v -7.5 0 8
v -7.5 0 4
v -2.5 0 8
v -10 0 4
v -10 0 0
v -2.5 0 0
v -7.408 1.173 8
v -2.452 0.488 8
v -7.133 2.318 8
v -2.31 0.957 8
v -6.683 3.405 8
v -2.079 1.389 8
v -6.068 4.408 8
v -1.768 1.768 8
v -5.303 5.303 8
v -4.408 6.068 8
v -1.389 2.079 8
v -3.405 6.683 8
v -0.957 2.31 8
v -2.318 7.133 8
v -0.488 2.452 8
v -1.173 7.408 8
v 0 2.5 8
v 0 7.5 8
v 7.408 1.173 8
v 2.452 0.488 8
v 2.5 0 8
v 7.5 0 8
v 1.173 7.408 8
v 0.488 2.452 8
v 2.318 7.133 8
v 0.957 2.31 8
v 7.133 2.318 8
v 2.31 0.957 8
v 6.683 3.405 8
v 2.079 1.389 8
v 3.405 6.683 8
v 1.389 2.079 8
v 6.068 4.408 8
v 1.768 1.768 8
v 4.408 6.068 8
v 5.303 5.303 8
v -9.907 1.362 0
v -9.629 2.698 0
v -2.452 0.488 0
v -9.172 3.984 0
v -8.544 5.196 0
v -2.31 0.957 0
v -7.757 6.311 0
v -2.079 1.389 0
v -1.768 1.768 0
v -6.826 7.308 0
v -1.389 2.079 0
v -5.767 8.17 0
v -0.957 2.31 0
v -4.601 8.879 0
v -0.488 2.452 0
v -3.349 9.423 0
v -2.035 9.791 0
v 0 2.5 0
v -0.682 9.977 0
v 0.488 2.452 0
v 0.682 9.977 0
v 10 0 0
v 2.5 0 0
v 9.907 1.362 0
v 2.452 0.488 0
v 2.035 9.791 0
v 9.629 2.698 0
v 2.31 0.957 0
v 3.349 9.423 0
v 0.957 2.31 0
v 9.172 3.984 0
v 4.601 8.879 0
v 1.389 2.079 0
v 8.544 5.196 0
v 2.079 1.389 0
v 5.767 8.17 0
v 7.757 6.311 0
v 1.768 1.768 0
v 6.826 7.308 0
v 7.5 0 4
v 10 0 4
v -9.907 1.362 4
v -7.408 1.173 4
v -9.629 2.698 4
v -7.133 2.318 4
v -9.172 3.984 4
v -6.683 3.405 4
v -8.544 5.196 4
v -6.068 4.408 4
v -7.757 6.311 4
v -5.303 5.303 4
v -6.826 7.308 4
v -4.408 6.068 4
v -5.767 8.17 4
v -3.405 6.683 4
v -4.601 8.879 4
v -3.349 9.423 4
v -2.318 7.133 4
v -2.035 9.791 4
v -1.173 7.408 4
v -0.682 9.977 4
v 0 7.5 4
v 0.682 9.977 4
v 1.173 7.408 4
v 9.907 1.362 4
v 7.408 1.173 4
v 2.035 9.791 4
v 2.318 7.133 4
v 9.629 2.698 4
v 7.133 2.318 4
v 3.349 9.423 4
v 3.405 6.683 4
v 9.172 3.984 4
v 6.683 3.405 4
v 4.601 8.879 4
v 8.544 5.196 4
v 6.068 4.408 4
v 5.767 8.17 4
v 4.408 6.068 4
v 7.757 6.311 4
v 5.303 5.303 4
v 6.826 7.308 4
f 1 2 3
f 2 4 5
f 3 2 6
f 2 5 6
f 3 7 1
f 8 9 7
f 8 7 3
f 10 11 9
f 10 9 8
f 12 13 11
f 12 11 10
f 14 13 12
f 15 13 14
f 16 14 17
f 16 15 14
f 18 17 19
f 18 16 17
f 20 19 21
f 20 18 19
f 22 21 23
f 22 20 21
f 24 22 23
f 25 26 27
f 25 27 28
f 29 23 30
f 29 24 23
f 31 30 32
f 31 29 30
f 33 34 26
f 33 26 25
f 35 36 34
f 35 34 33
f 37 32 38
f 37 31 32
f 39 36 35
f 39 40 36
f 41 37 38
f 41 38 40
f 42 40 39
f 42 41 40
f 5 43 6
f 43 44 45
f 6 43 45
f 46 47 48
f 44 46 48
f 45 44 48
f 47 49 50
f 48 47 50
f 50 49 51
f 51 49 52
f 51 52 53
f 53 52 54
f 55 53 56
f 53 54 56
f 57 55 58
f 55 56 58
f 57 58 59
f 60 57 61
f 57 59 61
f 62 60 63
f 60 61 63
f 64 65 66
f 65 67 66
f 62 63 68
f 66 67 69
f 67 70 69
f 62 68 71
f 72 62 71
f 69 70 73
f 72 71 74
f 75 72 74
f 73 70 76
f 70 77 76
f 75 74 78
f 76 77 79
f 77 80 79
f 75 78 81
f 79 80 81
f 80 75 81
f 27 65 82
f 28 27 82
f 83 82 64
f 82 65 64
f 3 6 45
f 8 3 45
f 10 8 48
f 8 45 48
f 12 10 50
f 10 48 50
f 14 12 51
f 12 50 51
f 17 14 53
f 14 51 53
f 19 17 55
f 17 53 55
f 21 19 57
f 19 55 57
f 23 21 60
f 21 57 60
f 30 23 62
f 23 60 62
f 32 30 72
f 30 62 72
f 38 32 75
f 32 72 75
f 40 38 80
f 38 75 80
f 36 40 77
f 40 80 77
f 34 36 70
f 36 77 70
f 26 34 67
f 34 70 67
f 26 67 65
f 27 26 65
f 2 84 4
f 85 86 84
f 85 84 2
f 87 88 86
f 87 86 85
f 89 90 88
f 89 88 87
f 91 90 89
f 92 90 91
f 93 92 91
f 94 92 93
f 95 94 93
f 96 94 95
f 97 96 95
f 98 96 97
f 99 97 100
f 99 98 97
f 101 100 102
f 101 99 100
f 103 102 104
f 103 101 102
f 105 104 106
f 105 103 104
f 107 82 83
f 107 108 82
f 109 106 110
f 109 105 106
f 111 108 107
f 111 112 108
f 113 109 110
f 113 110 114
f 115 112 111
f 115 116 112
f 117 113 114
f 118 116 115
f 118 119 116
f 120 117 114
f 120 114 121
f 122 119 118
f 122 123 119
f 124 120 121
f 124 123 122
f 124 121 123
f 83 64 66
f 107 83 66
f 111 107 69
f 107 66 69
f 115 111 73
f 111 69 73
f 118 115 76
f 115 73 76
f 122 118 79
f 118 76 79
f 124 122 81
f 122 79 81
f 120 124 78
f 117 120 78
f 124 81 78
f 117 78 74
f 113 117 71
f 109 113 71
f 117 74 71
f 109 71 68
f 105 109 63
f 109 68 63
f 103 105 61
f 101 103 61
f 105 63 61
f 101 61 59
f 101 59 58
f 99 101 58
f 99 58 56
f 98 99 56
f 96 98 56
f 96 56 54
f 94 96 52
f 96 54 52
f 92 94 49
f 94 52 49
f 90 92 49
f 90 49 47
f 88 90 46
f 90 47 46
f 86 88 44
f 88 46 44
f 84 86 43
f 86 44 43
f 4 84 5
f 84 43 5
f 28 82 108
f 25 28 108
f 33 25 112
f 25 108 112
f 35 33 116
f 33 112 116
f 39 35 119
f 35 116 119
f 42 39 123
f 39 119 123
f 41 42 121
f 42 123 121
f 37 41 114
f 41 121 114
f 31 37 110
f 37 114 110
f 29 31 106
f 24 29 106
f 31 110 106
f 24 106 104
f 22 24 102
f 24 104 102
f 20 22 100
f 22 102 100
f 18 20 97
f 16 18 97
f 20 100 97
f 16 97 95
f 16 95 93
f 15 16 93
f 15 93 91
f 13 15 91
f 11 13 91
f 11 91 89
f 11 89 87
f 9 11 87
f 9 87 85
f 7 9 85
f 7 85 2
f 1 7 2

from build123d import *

# Parameters (mm, degrees)
F2_DEPTH = 8
F3_DEPTH = 4
F4_DEPTH = 25


with BuildPart() as f2:
    # F0 (on Top) → F2 (new body)
    with BuildSketch(Plane.XY):
        with BuildLine():
            ThreePointArc((7.5, 0), (0, 7.5), (-7.5, 0))
            Line((-7.5, 0), (-2.5, 0))
            ThreePointArc((-2.5, 0), (0, 2.5), (2.5, 0))
            Line((2.5, 0), (7.5, 0))
        make_face()
    extrude(amount=F2_DEPTH)

    # F0 (on Top) → F3 (join)
    with BuildSketch(Plane.XY):
        with BuildLine():
            ThreePointArc((10, 0), (0, 10), (-10, 0))
            Line((-10, 0), (-7.5, 0))
            ThreePointArc((-7.5, 0), (0, 7.5), (7.5, 0))
            Line((7.5, 0), (10, 0))
        make_face()
        with BuildLine():
            ThreePointArc((7.5, 0), (0, 7.5), (-7.5, 0))
            Line((-7.5, 0), (-2.5, 0))
            ThreePointArc((-2.5, 0), (0, 2.5), (2.5, 0))
            Line((2.5, 0), (7.5, 0))
        make_face()
        with BuildLine():
            ThreePointArc((2.5, 0), (0, 2.5), (-2.5, 0))
            Line((-2.5, 0), (2.5, 0))
        make_face()
    extrude(amount=F3_DEPTH)

    # F4 (cut): a face of the model
    f4_faces = [f2.faces().sort_by_distance(p)[0] for p in [
        (0, 1.0610329539, 4),
    ]]
    extrude(f4_faces, amount=-F4_DEPTH, mode=Mode.SUBTRACT)


solid = f2.part
